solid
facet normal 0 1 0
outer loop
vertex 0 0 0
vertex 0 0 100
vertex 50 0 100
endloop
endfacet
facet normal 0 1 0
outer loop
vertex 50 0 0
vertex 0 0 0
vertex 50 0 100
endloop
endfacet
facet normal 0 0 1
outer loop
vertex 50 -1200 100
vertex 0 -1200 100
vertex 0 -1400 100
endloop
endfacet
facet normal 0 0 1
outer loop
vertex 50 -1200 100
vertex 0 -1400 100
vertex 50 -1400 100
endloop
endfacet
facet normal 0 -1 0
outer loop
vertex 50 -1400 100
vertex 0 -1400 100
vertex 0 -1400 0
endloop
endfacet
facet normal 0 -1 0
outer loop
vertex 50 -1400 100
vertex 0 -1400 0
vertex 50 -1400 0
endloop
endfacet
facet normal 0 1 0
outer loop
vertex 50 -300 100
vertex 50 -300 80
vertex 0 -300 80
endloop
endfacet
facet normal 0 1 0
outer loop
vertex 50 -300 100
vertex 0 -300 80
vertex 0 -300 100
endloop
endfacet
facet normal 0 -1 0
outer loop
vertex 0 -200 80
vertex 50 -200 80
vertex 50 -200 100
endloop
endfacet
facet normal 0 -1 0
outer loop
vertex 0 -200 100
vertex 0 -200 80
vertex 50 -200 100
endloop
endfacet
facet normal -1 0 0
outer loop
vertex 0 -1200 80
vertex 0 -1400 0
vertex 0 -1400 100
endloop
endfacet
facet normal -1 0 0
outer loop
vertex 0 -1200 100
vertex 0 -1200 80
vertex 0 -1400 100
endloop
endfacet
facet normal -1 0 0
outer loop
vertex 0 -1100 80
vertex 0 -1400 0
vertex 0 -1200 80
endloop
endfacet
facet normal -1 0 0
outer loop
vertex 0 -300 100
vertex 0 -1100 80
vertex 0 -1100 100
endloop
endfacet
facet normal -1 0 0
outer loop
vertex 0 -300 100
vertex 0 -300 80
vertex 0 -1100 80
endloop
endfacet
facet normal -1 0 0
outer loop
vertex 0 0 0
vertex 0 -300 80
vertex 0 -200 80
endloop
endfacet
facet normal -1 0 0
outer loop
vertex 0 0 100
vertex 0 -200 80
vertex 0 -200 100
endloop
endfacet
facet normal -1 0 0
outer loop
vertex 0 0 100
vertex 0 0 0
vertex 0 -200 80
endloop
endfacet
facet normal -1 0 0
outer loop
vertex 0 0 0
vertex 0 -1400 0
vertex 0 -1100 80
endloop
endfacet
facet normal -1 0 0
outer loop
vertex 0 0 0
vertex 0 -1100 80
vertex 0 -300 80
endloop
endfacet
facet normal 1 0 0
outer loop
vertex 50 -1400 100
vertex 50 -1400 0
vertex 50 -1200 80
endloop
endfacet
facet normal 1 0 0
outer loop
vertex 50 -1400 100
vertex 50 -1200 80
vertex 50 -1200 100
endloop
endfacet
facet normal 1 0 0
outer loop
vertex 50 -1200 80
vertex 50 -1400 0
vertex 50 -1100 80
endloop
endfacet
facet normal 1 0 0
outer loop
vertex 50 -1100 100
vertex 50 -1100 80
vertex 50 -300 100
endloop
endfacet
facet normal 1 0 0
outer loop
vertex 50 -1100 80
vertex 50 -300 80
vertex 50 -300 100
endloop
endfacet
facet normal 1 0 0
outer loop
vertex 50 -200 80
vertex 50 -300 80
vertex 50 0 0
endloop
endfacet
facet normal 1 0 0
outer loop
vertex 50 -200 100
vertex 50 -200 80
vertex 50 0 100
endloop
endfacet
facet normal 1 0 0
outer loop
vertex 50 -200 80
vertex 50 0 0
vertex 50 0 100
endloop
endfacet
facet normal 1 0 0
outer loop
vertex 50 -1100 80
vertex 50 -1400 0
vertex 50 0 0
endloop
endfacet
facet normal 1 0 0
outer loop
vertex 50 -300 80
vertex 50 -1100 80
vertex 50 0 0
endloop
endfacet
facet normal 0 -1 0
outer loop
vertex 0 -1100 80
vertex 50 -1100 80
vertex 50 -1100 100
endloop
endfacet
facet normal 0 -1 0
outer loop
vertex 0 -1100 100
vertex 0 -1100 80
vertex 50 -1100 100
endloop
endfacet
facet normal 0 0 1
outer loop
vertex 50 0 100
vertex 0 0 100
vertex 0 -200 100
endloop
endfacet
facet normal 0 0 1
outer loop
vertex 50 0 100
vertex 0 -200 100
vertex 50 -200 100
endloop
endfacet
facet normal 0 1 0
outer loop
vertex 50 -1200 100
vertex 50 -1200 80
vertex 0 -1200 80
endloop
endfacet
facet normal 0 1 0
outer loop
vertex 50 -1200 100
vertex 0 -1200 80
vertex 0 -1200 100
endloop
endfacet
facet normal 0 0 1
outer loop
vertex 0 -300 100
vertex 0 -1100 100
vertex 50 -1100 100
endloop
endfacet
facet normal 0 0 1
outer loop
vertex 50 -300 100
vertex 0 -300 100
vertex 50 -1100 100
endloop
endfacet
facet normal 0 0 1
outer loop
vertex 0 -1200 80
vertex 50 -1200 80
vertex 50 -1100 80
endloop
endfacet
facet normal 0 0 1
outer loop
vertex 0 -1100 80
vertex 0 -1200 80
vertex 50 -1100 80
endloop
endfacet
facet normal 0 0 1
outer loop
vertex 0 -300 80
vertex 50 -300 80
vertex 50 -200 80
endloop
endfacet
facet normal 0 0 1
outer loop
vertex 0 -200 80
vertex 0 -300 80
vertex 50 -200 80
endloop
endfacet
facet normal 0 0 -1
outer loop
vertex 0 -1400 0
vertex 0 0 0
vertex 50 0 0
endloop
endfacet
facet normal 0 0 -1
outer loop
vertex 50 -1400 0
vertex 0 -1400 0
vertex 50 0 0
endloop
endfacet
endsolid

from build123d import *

# Parameters (mm, degrees)
F0_W     = 50
F0_H     = 100
F1_DEPTH = 1400
F2_W     = 100
F2_H     = 20
F3_DEPTH = 50.001


with BuildPart() as f1:
    # F0 (on Front) → F1 (new body)
    with BuildSketch(Plane.XZ):
        with Locations((25, 50)):
            Rectangle(F0_W, F0_H)
    extrude(amount=F1_DEPTH)

    # F2 (on face) → F3 (cut, through all)
    with BuildSketch(Plane.YZ.offset(50)):
        with Locations((-250, 90)):
            Rectangle(F2_W, F2_H)
        with Locations((-1150, 90)):
            Rectangle(F2_W, F2_H)
    extrude(amount=-F3_DEPTH, mode=Mode.SUBTRACT)


solid = f1.part
